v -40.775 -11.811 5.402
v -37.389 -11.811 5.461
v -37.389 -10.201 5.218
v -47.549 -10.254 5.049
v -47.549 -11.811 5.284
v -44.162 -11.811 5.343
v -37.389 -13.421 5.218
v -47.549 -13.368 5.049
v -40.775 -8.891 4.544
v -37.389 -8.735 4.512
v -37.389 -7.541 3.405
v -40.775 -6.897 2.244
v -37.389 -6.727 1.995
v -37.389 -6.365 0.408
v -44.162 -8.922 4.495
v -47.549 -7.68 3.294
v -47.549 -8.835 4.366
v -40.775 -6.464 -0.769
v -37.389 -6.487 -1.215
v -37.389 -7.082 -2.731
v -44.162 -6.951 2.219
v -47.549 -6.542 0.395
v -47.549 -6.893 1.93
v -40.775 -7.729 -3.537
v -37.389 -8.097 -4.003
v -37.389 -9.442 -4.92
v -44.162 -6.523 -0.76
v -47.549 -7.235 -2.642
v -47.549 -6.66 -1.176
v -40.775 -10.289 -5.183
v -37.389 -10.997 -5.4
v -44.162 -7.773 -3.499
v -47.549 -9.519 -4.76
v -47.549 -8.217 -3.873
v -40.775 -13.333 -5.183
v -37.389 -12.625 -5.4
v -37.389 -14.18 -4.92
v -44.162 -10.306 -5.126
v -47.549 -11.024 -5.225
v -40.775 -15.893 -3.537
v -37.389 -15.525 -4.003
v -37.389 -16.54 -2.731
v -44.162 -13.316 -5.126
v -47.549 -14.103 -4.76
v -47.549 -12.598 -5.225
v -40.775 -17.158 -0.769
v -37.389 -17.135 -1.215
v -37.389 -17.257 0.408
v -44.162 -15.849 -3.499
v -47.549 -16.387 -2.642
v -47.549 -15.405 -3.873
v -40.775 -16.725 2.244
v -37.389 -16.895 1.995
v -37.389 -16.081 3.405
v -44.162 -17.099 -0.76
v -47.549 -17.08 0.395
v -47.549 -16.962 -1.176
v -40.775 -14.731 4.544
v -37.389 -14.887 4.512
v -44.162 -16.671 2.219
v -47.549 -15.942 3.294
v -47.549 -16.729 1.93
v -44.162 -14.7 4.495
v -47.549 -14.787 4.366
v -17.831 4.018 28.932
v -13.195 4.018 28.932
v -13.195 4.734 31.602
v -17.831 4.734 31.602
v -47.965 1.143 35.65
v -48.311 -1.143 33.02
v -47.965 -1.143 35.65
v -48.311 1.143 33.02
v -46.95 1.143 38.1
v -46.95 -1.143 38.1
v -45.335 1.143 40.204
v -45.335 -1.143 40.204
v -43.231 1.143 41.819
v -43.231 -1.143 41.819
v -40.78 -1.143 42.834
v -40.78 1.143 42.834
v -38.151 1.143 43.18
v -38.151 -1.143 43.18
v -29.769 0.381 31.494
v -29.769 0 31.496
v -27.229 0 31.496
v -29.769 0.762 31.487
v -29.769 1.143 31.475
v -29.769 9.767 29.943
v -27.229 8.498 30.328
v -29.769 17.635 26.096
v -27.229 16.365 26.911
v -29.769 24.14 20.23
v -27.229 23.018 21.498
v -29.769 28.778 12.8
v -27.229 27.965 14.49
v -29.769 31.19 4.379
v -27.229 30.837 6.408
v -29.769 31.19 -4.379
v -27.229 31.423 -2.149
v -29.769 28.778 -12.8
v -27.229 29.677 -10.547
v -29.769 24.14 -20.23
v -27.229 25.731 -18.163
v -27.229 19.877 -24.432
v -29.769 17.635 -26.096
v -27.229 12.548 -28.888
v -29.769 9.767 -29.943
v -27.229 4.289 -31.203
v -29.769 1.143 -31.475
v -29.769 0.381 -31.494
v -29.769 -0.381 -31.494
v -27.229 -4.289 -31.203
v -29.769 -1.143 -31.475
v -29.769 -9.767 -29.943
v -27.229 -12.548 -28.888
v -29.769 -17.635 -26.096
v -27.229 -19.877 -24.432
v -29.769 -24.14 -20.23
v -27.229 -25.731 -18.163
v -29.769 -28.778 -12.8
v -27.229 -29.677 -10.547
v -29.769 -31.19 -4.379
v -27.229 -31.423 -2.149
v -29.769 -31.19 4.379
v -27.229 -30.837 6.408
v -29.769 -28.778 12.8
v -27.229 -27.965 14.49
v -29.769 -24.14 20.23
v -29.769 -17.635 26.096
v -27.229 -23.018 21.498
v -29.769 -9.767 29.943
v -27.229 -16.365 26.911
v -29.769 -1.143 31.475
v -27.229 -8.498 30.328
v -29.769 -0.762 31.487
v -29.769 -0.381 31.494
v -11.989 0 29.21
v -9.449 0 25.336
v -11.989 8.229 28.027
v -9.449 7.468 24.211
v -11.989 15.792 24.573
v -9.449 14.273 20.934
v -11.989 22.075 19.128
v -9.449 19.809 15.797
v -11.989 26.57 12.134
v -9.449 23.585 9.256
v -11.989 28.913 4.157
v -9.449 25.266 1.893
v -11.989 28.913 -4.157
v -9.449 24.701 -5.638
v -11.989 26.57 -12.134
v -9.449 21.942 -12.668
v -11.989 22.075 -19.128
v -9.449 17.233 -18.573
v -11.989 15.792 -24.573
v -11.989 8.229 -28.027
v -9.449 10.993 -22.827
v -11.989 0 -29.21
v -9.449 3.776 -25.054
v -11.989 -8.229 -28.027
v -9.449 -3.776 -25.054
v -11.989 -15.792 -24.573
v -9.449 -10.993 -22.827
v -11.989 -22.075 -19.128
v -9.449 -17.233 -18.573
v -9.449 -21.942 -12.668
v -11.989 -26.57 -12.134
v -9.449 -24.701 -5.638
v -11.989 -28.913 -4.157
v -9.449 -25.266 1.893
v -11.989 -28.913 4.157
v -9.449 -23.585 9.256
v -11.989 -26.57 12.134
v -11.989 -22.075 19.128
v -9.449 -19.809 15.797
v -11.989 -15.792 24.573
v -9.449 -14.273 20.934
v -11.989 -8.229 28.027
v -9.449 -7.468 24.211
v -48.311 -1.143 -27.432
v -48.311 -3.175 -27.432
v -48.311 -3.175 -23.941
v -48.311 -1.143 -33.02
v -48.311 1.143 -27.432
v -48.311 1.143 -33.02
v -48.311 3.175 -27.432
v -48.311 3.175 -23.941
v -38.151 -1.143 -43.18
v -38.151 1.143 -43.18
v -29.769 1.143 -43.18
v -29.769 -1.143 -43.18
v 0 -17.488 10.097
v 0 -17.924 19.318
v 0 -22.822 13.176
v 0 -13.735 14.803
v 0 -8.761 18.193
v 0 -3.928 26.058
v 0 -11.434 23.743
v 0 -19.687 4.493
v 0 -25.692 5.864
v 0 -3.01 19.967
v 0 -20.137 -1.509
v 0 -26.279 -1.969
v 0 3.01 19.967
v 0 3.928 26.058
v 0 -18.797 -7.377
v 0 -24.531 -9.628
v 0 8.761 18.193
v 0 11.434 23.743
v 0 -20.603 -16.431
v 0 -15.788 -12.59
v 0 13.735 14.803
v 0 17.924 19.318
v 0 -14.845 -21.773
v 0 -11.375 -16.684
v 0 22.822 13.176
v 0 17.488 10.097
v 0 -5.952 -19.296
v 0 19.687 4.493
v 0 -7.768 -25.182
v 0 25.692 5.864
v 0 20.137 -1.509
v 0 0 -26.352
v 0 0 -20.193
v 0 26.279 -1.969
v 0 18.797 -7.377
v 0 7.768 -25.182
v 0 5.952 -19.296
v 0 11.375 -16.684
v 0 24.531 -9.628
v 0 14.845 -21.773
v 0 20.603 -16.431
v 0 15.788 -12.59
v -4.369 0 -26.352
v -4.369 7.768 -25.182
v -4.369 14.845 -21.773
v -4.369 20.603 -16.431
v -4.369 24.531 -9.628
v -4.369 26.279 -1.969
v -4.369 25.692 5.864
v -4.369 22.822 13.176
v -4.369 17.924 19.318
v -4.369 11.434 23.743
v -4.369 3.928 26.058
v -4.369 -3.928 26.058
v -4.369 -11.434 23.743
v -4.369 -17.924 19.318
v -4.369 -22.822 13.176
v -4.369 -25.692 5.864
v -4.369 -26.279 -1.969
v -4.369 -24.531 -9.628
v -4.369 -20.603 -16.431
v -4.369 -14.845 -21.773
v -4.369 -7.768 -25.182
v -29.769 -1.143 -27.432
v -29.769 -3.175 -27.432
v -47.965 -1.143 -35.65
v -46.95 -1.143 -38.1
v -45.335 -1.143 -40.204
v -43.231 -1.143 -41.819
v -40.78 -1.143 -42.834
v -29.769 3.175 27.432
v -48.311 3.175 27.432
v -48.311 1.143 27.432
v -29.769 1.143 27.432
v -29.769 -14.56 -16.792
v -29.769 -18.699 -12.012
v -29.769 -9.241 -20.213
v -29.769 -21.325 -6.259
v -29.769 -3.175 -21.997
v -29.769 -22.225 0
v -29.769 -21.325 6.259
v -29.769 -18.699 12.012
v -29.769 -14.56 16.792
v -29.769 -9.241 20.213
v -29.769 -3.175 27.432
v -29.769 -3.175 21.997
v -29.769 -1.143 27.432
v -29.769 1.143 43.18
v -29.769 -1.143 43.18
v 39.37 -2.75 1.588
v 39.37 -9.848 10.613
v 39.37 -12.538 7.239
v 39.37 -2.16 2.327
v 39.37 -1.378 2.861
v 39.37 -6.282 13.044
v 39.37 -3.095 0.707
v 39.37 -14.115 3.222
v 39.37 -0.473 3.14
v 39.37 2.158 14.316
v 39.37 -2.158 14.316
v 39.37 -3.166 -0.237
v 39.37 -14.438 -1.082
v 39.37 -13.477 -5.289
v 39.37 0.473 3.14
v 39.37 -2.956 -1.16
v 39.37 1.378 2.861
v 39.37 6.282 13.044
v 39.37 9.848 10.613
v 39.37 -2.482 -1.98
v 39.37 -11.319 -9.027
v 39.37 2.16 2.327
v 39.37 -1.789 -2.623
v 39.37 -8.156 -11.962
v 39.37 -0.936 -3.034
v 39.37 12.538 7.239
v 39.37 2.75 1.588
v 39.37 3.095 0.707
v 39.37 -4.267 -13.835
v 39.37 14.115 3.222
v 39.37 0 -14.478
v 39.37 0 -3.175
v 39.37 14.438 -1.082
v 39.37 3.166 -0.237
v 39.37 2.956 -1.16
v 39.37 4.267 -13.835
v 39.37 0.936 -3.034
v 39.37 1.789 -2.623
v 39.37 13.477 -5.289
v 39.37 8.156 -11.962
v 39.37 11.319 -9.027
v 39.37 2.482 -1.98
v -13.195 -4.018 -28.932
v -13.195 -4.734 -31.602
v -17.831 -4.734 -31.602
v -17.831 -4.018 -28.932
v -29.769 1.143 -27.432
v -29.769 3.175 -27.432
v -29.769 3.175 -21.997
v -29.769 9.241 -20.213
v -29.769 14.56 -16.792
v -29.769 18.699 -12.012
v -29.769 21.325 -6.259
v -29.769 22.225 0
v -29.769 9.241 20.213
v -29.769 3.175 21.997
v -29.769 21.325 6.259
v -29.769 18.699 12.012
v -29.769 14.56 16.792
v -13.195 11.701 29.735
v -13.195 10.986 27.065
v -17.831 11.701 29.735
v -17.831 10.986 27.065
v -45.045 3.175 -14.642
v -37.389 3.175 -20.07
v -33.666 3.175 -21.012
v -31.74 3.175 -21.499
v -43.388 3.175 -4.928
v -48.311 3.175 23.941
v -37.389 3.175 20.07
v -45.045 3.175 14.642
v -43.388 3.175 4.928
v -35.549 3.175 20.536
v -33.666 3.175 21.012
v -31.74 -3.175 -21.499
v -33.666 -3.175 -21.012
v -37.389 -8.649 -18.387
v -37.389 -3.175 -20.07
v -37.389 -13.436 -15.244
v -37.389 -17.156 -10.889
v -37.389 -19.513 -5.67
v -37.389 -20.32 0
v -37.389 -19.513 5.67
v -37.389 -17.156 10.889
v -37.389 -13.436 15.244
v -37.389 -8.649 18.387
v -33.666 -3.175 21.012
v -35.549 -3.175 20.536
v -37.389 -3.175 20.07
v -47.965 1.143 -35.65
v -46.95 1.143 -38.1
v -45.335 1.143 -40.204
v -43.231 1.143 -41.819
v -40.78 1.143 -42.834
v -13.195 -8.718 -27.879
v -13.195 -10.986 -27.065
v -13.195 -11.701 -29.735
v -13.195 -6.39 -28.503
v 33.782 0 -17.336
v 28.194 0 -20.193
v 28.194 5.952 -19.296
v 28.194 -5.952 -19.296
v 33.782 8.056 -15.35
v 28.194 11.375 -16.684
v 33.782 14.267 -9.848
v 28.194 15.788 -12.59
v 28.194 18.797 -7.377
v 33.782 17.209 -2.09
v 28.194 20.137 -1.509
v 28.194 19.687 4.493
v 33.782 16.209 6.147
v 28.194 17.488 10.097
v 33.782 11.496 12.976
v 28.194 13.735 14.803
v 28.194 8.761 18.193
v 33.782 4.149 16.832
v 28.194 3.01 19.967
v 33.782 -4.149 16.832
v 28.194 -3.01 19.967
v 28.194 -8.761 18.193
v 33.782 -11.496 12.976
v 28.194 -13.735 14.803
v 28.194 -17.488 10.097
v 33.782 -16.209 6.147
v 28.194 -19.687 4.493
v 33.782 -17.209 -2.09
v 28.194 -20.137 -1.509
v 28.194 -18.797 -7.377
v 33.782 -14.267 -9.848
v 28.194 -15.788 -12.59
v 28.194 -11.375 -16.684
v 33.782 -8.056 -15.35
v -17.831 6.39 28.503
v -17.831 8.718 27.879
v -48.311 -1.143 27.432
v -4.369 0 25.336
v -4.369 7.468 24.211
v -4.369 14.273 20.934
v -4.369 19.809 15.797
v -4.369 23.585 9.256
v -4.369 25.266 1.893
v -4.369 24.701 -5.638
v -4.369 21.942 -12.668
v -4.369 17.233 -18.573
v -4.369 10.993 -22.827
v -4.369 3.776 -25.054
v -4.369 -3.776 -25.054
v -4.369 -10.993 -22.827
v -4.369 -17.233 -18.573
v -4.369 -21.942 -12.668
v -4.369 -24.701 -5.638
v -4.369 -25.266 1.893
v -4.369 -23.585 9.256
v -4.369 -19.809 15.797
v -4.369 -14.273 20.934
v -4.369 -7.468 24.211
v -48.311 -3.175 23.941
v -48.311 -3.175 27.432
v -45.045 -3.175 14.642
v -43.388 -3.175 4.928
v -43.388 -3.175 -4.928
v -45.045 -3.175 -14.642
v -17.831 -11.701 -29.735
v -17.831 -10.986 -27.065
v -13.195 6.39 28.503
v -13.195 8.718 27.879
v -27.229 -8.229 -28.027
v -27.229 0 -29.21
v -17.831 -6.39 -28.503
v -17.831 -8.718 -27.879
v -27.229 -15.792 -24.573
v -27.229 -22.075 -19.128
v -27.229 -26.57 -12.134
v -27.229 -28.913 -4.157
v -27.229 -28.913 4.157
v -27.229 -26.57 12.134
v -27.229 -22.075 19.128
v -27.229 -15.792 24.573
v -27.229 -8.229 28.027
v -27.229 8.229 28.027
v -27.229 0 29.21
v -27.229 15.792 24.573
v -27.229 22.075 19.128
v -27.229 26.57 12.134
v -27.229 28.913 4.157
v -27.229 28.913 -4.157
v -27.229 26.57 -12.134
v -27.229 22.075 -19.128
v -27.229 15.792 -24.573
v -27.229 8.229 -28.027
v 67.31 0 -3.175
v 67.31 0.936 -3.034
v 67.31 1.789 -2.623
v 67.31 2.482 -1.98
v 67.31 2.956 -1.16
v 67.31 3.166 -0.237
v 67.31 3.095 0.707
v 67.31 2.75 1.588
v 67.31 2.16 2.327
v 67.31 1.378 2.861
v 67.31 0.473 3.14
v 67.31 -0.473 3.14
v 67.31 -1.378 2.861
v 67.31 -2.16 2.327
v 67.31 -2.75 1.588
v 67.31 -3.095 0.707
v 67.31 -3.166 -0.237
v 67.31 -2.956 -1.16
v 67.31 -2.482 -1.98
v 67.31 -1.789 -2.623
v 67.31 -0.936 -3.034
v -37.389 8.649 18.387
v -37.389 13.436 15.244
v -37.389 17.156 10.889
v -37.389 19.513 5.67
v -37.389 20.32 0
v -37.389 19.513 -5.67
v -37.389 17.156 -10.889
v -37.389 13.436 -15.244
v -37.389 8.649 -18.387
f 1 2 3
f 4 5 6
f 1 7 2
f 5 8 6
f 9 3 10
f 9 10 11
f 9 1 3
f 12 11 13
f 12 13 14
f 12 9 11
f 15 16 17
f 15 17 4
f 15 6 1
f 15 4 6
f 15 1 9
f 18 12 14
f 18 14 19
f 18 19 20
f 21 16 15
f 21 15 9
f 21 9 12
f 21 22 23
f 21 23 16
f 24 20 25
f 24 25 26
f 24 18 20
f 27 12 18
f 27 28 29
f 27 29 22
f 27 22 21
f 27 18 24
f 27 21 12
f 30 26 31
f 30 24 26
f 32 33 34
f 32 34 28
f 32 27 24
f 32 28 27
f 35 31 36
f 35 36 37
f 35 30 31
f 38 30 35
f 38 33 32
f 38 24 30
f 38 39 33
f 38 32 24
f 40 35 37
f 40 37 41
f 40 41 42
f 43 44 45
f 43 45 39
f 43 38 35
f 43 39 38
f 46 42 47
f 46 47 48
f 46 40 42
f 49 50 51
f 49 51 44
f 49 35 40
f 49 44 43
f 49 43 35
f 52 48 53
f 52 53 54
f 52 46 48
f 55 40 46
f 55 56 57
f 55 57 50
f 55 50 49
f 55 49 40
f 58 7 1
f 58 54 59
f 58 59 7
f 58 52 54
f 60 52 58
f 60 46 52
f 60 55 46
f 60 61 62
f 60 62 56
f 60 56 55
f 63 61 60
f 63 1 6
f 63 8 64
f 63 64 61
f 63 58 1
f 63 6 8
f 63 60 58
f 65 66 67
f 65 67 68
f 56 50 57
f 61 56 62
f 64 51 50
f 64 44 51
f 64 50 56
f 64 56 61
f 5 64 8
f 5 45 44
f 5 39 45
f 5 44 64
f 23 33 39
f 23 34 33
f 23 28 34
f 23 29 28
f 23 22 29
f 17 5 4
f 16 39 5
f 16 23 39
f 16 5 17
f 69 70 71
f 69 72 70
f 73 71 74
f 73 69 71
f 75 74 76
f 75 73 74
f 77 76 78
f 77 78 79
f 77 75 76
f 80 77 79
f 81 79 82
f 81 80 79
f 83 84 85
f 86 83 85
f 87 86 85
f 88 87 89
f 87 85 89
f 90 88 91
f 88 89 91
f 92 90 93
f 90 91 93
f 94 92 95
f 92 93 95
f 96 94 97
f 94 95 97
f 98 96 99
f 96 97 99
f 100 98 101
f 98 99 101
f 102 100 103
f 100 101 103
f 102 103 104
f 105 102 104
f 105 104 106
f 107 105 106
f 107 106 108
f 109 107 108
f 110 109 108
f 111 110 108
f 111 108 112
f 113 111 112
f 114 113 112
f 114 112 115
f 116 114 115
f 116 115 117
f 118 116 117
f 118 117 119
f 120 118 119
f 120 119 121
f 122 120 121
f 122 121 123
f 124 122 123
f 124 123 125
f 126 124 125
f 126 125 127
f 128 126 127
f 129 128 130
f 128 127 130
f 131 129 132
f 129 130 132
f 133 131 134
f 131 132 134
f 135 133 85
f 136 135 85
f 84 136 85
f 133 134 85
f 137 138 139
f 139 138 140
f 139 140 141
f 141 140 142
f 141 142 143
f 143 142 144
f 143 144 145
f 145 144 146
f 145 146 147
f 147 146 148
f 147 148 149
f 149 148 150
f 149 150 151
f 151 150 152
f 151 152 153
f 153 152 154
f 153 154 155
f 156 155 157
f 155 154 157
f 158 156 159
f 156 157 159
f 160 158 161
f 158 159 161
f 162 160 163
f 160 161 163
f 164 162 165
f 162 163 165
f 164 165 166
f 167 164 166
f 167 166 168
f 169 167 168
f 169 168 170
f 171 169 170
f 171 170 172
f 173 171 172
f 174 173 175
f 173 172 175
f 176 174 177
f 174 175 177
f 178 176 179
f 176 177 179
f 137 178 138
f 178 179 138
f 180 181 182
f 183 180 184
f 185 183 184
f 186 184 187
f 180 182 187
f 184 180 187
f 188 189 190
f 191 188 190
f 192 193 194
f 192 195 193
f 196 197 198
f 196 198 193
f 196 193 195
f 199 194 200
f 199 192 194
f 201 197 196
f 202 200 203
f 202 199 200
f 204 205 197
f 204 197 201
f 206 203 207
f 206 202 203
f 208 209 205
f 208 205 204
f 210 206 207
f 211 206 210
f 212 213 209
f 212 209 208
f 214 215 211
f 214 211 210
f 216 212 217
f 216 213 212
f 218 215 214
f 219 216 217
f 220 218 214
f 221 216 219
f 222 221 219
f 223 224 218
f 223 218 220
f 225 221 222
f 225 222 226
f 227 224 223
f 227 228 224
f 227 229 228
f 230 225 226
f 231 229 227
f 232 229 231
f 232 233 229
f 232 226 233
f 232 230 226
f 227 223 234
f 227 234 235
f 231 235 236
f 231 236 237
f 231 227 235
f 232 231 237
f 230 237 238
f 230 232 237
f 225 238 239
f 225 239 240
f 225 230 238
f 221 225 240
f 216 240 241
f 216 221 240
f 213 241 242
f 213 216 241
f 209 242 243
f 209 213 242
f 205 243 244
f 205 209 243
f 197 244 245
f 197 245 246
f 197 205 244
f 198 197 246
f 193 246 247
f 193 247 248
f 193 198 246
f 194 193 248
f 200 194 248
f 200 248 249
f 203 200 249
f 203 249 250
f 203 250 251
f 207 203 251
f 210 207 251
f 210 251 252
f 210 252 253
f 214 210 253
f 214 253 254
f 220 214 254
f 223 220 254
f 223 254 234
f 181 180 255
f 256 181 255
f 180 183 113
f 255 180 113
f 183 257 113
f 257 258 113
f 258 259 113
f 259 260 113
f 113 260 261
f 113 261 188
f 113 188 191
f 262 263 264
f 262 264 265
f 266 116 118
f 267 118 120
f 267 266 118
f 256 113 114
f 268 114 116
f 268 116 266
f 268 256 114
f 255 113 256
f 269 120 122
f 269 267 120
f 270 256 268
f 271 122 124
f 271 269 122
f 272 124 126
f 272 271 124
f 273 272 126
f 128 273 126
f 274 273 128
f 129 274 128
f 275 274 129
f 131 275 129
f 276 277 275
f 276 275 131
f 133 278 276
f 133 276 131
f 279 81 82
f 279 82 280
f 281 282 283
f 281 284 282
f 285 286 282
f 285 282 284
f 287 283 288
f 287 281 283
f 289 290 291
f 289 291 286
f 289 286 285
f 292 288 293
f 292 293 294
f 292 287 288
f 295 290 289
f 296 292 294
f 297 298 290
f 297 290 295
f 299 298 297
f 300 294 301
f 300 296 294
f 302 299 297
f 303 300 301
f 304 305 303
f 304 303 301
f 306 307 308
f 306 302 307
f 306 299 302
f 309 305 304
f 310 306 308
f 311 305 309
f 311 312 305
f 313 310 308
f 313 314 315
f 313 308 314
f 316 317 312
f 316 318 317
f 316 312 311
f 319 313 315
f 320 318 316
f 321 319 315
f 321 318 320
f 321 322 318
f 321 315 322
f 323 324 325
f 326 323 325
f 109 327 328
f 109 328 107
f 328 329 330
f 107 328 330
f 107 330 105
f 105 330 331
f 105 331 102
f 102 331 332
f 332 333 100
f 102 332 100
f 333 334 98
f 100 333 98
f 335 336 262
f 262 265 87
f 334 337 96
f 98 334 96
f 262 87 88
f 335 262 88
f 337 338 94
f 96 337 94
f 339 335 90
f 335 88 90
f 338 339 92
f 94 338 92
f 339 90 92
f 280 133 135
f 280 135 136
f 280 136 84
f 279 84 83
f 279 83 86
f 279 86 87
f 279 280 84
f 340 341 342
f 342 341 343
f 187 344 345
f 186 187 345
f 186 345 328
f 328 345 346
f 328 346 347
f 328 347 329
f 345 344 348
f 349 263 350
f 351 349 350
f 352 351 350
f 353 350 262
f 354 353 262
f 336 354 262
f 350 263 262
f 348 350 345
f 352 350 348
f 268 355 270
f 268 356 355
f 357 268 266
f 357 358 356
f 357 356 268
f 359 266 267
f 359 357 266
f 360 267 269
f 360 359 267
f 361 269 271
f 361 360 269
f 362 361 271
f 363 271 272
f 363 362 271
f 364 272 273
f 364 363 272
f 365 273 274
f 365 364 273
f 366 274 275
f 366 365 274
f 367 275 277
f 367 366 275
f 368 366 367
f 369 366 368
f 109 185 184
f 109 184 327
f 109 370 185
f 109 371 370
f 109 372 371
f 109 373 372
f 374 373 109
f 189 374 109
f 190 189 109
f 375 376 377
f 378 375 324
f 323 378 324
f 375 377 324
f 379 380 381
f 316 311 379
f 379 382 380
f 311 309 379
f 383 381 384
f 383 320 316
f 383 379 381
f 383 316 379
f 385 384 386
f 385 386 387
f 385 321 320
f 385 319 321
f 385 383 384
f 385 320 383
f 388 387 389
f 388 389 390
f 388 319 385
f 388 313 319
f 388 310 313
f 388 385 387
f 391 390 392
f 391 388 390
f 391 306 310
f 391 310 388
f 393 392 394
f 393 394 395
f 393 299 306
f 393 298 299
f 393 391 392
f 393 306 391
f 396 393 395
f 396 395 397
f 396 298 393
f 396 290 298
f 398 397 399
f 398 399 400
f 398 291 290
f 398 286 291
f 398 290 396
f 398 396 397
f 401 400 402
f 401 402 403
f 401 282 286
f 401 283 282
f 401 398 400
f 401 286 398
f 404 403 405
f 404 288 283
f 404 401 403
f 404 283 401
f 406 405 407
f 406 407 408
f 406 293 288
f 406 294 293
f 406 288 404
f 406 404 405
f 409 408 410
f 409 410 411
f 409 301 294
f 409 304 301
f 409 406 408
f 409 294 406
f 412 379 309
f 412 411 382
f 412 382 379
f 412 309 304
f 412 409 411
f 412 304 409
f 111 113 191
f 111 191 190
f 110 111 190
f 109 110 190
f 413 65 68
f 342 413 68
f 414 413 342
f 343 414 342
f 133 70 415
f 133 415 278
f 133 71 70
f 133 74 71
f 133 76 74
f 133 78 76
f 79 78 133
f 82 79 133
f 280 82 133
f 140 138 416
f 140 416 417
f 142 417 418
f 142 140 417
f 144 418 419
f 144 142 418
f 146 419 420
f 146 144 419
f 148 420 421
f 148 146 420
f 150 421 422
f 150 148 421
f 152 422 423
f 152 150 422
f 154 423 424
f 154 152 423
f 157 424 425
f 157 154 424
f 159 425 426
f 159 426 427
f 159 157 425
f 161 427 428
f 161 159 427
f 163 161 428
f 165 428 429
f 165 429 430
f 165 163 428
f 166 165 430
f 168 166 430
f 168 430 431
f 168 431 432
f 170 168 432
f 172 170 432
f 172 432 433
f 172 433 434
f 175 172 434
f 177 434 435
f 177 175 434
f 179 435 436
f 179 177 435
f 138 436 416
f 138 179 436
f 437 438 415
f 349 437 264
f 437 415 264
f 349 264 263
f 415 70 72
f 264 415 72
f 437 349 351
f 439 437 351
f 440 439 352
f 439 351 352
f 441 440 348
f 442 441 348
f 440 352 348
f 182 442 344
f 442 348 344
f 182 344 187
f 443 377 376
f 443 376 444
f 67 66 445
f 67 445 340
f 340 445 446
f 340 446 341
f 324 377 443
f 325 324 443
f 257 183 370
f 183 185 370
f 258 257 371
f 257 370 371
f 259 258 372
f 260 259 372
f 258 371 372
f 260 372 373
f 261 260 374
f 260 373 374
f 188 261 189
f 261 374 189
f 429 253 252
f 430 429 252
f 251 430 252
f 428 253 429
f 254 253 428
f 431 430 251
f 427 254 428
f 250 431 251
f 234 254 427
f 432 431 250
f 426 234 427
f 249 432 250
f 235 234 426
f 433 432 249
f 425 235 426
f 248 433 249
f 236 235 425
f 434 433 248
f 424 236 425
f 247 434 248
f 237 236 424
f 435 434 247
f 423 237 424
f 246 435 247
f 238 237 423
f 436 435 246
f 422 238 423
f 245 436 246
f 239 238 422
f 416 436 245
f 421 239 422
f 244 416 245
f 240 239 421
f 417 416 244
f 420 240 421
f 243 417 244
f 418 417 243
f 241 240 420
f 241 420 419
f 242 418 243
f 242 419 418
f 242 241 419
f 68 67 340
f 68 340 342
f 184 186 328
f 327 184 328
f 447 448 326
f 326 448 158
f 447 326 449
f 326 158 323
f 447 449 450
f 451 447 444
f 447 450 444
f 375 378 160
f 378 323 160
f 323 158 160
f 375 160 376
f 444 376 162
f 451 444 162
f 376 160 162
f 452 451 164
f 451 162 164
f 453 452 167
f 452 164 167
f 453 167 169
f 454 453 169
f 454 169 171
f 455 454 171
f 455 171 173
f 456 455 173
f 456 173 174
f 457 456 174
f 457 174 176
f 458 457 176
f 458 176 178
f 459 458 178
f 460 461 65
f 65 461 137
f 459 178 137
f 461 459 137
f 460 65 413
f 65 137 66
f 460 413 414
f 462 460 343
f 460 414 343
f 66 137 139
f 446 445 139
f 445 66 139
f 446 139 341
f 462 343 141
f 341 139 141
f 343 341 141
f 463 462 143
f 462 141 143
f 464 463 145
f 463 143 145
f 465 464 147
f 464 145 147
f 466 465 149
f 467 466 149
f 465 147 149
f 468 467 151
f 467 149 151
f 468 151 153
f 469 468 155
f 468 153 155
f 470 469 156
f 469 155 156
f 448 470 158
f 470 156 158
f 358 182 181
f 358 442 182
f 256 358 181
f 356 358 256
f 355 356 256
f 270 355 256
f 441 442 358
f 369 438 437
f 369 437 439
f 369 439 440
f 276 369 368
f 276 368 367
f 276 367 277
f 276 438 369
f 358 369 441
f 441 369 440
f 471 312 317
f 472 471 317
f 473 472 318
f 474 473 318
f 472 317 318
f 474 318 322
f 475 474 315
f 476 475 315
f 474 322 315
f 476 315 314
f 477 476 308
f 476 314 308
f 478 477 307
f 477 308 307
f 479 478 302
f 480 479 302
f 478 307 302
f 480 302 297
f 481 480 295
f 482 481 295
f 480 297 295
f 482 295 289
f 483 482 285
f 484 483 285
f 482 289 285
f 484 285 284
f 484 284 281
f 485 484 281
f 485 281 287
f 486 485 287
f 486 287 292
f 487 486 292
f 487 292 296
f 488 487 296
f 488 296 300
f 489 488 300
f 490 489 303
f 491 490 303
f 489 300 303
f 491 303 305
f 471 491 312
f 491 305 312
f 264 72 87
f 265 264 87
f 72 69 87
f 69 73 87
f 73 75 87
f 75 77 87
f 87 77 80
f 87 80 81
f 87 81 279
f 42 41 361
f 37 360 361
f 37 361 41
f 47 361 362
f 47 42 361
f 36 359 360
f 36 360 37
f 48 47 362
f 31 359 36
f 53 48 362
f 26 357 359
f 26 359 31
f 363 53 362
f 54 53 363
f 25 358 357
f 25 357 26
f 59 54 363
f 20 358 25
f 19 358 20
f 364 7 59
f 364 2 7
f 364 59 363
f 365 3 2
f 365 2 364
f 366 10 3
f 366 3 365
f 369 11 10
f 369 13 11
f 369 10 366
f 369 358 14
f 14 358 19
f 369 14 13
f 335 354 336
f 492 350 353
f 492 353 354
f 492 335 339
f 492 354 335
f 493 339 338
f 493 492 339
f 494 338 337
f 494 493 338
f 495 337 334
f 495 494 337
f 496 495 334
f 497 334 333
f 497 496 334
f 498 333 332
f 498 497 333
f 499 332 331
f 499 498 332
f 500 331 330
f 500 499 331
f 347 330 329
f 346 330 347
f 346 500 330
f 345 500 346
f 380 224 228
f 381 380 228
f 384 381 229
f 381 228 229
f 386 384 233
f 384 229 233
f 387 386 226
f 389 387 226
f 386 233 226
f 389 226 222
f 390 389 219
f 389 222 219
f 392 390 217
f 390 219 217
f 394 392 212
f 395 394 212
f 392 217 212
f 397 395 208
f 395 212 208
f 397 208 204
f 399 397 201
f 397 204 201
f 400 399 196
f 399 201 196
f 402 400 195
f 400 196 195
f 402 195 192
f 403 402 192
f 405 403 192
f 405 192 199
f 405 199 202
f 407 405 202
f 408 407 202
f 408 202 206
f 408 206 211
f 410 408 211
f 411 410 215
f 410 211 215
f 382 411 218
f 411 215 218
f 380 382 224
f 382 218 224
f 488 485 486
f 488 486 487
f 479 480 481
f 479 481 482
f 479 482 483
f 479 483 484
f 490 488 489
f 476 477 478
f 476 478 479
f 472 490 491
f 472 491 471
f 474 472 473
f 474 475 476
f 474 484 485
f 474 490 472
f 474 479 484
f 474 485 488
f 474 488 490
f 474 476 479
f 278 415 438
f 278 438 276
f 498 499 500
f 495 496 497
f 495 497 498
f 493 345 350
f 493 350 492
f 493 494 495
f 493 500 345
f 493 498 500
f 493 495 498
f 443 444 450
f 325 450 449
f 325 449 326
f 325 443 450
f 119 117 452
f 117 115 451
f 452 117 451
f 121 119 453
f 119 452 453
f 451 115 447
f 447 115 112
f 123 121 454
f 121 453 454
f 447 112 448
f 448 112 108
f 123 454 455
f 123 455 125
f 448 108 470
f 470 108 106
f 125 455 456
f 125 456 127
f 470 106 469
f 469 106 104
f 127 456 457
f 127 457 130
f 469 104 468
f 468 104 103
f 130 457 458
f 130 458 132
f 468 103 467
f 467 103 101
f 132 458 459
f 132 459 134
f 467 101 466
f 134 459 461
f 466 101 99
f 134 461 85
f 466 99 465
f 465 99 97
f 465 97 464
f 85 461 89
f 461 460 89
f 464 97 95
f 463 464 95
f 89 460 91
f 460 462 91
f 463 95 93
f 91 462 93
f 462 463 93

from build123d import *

# Parameters (mm, degrees)
SKETCH1_R           = 20.193
BOSS_EXTRUDE1_DEPTH = 28.194
SKETCH2_R           = 20.193
SKETCH3_R           = 14.478
SKETCH4_R           = 3.175
BOSS_EXTRUDE2_DEPTH = 27.94
SKETCH5_R           = 26.3525
BOSS_EXTRUDE4_DEPTH = 9.4488
SKETCH6_OUTSIDE_W   = 76.102
SKETCH6_OUTSIDE_H   = 76.102
SKETCH6_OUTSIDE_R   = 25.3365
CUT_EXTRUDE1_DEPTH  = 5.08
SKETCH9_R           = 29.21
SKETCH10_R          = 29.21
BOSS_EXTRUDE5_DEPTH = 15.24
SKETCH11_R          = 31.496
BOSS_EXTRUDE6_DEPTH = 2.54
SKETCH14_R          = 22.225
SKETCH12_R          = 20.32
SKETCH15_W          = 18.542
SKETCH15_H          = 6.35
BOSS_EXTRUDE7_DEPTH = 43.18
SKETCH16_W          = 18.542
SKETCH16_H          = 2.032
CUT_EXTRUDE2_DEPTH  = 15.748
SKETCH17_R          = 5.461
BOSS_EXTRUDE8_DEPTH = 10.16
BOSS_EXTRUDE8_TAPER = 1
CUT_EXTRUDE3_REACH  = 89.162
FILLET1_R           = 10.16
FILLET3_R           = 10.16
SKETCH20_W          = 4.6355
SKETCH20_H          = 7.2136
BOSS_EXTRUDE9_DEPTH = 31.75


with BuildPart() as part:
    # Sketch1 → Boss-Extrude1 (new body)
    with BuildSketch(Plane(origin=(0, 0, 0), x_dir=(0, 0, -1), z_dir=(1, 0, 0))):
        Circle(SKETCH1_R)
    extrude(amount=BOSS_EXTRUDE1_DEPTH)

    # Sketch2 → Loft2 section 0
    with BuildSketch(Plane(origin=(28.194, 0, 0), x_dir=(0, 0, -1), z_dir=(1, 0, 0))):
        Circle(SKETCH2_R)
    # Sketch3 → Loft2 section 1
    with BuildSketch(Plane(origin=(39.37, 0, 0), x_dir=(0, 0, -1), z_dir=(1, 0, 0))):
        Circle(SKETCH3_R)
    loft()

    # Sketch4 → Boss-Extrude2 (add)
    with BuildSketch(Plane(origin=(39.37, 0, 0), x_dir=(0, 0, -1), z_dir=(1, 0, 0))):
        Circle(SKETCH4_R)
    extrude(amount=BOSS_EXTRUDE2_DEPTH)

    # Sketch5 → Boss-Extrude4 (add)
    with BuildSketch(Plane(origin=(0, 0, 0), x_dir=(0, 0, -1), z_dir=(1, 0, 0))):
        Circle(SKETCH5_R)
    extrude(amount=-BOSS_EXTRUDE4_DEPTH)

    # Sketch6 outside → Cut-Extrude1 (cut)
    with BuildSketch(Plane.ZY.offset(9.4488)):
        Rectangle(SKETCH6_OUTSIDE_W, SKETCH6_OUTSIDE_H)
        Circle(SKETCH6_OUTSIDE_R, mode=Mode.SUBTRACT)
    extrude(amount=-CUT_EXTRUDE1_DEPTH, mode=Mode.SUBTRACT)

    # Sketch9 → section 0 of loft3
    with BuildSketch(Plane.ZY.offset(11.9888), mode=Mode.PRIVATE) as loft3_s0:
        Circle(SKETCH9_R)
    # loft up to a face of the part (loft3)
    loft([loft3_s0.sketch, Face(Wire([part.edges().sort_by_distance((-9.4488, 18.469513629, -17.344027749))[0]]))])

    # Sketch10 → Boss-Extrude5 (add)
    with BuildSketch(Plane.ZY.offset(11.9888)):
        with Locations(Location((0, 0, 0), (0, 0, 180))):
            Circle(SKETCH10_R)
    extrude(amount=BOSS_EXTRUDE5_DEPTH)

    # Sketch11 → Boss-Extrude6 (add)
    with BuildSketch(Plane.ZY.offset(27.2288)):
        Circle(SKETCH11_R)
    extrude(amount=BOSS_EXTRUDE6_DEPTH)

    # Sketch14 → Loft6 section 0
    with BuildSketch(Plane.ZY.offset(29.7688)):
        Circle(SKETCH14_R)
    # Sketch12 → Loft6 section 1
    with BuildSketch(Plane.ZY.offset(37.3888)):
        Circle(SKETCH12_R)
    loft()

    # Sketch15 → Boss-Extrude7 (add, symmetric)
    with BuildSketch(Plane.XY):
        with Locations((-39.0398, 0)):
            Rectangle(SKETCH15_W, SKETCH15_H)
    extrude(amount=BOSS_EXTRUDE7_DEPTH, both=True)

    # Sketch16 → Cut-Extrude2 (cut)
    with BuildSketch(Plane.XY.offset(43.18)):
        with Locations((-39.0398, 2.159)):
            Rectangle(SKETCH16_W, SKETCH16_H)
        with Locations((-39.0398, -2.159)):
            Rectangle(SKETCH16_W, SKETCH16_H)
    cut_extrude2 = extrude(amount=-CUT_EXTRUDE2_DEPTH, mode=Mode.SUBTRACT)

    # Mirror1: Cut-Extrude2 across plane
    add(cut_extrude2.mirror(Plane.XY), mode=Mode.SUBTRACT)

    # Sketch17 → Boss-Extrude8 (add)
    with BuildSketch(Plane.ZY.offset(37.3888)):
        with Locations((0, -11.811)):
            Circle(SKETCH17_R)
    extrude(amount=BOSS_EXTRUDE8_DEPTH, taper=BOSS_EXTRUDE8_TAPER)

    # Sketch18 → Cut-Extrude3 (cut, up to next)
    with BuildSketch(Plane(origin=(0, 3.175, 0), x_dir=(1, 0, 0), z_dir=(0, 1, 0)), mode=Mode.PRIVATE) as cut_extrude3_sk1:
        with BuildLine():
            Line((-48.3108, 23.940709333), (-48.3108, -23.940709333))
            ThreePointArc((-48.3108, -23.940709333), (-43.18, 0), (-48.3108, 23.940709333))
        make_face()
    cut_extrude3_tool1 = extrude(cut_extrude3_sk1.sketch, amount=-CUT_EXTRUDE3_REACH, mode=Mode.PRIVATE) & part.part
    add(cut_extrude3_tool1.solids().sort_by_distance((-46.250554, 3.175, 0))[0], mode=Mode.SUBTRACT)

    # Fillet1
    fillet1_edges = [part.edges().sort_by_distance(p)[0] for p in [
        (-48.3108, 0, -43.18),
    ]]
    fillet(fillet1_edges, radius=FILLET1_R)

    # Fillet3
    fillet3_edges = [part.edges().sort_by_distance(p)[0] for p in [
        (-48.3108, 0, 43.18),
    ]]
    fillet(fillet3_edges, radius=FILLET3_R)

    # Sketch20 → Boss-Extrude9 (add, symmetric)
    with BuildSketch(Plane(origin=(0, 0, 0), x_dir=(-1, 0, 0), z_dir=(0, -0.25881904510250753, -0.9659258262890719))):
        with Locations((15.51305, 0)):
            Rectangle(SKETCH20_W, SKETCH20_H)
    extrude(amount=BOSS_EXTRUDE9_DEPTH, both=True)


solid = part.part
